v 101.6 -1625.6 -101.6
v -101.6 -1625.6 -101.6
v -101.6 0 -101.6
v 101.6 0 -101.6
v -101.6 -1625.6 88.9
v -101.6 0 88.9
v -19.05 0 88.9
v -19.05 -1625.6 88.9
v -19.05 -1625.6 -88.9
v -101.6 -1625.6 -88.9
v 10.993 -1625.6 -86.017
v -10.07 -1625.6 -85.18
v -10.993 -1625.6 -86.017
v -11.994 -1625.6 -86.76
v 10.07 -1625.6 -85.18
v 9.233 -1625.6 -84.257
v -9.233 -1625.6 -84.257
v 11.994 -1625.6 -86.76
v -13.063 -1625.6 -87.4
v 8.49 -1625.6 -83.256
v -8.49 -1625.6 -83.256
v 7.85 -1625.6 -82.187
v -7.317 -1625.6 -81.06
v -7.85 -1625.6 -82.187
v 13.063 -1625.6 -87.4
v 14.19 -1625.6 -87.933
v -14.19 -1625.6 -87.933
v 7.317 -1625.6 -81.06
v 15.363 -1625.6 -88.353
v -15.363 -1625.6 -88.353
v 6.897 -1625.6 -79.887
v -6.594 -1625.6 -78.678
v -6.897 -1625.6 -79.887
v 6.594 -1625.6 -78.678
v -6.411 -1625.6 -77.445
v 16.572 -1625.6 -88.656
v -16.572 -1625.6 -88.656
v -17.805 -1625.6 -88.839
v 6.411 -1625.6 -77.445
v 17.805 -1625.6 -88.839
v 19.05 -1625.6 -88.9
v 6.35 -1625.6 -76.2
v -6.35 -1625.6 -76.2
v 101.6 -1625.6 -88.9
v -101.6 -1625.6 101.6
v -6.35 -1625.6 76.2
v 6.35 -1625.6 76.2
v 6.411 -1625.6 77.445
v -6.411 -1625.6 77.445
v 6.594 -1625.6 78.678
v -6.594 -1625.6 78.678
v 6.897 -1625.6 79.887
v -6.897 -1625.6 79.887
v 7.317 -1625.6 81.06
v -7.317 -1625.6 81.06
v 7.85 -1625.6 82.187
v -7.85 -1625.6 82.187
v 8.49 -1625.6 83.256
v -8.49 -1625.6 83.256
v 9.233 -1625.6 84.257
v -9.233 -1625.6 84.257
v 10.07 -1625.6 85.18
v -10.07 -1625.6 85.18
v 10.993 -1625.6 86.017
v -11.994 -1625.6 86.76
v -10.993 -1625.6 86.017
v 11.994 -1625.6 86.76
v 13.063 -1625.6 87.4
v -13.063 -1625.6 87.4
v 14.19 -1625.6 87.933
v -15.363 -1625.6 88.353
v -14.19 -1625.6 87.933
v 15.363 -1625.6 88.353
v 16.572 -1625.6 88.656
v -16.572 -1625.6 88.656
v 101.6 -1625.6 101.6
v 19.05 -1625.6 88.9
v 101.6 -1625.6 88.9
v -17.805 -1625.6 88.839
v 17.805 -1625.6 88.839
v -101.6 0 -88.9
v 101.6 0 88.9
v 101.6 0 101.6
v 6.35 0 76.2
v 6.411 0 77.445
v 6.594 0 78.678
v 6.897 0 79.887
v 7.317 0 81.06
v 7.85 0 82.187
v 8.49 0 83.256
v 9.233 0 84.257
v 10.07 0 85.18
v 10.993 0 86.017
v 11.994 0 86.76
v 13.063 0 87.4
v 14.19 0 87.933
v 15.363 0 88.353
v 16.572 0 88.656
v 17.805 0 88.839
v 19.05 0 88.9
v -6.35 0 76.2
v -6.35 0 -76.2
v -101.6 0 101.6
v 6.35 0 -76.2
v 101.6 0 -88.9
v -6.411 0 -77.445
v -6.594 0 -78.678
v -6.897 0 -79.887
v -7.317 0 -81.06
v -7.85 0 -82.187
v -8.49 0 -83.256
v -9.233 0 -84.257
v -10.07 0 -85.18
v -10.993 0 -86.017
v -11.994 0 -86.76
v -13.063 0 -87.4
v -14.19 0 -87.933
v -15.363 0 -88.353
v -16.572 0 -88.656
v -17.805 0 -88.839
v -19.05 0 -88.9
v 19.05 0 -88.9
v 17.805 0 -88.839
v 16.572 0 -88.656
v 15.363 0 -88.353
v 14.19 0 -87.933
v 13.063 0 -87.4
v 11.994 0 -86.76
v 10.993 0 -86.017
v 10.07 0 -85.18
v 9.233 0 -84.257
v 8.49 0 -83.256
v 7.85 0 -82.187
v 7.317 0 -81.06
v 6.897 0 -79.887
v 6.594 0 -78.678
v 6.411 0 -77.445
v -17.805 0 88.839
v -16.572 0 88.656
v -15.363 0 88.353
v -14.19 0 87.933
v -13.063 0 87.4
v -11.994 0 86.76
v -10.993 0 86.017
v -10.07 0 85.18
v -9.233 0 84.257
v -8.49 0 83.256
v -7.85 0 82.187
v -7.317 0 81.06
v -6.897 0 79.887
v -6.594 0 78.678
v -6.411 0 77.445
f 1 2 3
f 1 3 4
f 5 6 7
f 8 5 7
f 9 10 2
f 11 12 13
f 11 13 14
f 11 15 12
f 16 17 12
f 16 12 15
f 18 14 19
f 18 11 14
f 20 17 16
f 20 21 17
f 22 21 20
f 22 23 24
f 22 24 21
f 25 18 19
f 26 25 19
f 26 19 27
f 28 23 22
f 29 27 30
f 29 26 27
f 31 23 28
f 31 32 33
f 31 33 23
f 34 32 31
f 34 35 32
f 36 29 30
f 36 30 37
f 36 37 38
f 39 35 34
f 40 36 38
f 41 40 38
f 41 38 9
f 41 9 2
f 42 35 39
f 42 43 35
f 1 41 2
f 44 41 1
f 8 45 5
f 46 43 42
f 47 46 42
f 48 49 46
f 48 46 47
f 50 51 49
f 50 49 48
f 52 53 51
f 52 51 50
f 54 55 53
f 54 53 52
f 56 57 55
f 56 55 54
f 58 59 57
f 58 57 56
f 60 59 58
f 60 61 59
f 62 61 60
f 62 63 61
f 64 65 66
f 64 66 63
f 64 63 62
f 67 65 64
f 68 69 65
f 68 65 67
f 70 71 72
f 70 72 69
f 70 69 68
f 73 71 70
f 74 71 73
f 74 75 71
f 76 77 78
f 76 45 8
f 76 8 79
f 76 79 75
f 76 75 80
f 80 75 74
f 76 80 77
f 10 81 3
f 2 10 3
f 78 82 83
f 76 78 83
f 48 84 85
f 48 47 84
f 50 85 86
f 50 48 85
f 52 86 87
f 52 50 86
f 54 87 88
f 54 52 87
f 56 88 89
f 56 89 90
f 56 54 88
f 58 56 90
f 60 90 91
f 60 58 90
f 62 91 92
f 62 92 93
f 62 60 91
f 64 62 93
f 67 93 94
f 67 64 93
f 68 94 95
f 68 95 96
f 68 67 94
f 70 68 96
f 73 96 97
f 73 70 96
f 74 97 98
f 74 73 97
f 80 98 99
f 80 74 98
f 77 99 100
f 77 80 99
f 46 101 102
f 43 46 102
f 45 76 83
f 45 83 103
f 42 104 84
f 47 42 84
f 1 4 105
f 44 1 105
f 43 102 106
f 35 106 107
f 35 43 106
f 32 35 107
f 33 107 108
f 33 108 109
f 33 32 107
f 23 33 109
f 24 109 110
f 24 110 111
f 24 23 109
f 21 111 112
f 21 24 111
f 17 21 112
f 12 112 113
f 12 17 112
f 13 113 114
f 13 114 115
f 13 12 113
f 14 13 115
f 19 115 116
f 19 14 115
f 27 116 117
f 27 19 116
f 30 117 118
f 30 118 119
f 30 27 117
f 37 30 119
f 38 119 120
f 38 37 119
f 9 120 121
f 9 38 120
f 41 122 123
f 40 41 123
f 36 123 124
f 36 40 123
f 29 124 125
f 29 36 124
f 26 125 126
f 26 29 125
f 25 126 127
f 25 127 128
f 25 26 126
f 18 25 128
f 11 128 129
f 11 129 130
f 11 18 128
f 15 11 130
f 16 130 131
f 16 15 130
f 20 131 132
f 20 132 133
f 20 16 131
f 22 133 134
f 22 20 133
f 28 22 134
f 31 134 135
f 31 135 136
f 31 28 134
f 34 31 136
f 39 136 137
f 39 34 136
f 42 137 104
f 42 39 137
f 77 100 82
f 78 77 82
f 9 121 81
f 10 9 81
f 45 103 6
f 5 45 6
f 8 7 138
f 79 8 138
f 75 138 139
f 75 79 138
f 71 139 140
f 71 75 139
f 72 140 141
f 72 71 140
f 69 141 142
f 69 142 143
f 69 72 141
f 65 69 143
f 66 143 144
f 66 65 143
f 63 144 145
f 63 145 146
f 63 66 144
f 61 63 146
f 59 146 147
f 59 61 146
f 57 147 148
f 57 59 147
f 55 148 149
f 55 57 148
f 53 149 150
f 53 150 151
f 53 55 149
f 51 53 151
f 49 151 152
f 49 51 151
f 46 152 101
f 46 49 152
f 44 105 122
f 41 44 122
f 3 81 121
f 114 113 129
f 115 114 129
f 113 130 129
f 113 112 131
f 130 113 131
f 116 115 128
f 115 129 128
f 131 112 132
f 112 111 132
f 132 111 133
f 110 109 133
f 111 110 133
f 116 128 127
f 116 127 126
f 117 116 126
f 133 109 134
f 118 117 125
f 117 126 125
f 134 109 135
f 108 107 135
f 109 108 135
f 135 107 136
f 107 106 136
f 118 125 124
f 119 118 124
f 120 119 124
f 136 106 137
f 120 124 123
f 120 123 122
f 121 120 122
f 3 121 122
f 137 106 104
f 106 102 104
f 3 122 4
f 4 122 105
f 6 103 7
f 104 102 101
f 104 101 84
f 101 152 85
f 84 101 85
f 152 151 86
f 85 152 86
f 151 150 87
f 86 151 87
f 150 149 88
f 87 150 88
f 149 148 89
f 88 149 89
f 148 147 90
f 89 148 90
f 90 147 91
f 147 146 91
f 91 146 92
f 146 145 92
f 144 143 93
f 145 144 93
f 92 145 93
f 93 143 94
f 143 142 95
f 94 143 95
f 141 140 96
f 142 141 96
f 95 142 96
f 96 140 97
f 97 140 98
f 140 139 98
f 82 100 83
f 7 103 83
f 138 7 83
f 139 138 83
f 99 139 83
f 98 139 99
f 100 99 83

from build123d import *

# Parameters (mm, degrees)
F1_DEPTH = 1625.6
F2_R     = 12.7


with BuildPart() as f1:
    # F0 (on Front) → F1 (new body)
    with BuildSketch(Plane.XZ):
        Polygon((6.35, -101.6), (101.6, -101.6), (101.6, -88.9), (6.35, -88.9), (6.35, 88.9), (101.6, 88.9), (101.6, 101.6), (-101.6, 101.6), (-101.6, 88.9), (-6.35, 88.9), (-6.35, -88.9), (-101.6, -88.9), (-101.6, -101.6), (-6.35, -101.6), align=None)
    extrude(amount=F1_DEPTH)

    # F2
    f2_edges = [f1.edges().sort_by_distance(p)[0] for p in [
        (-6.35, -812.8, -88.9),
        (6.35, -812.8, -88.9),
        (6.35, -812.8, 88.9),
        (-6.35, -812.8, 88.9),
    ]]
    fillet(f2_edges, radius=F2_R)


solid = f1.part
